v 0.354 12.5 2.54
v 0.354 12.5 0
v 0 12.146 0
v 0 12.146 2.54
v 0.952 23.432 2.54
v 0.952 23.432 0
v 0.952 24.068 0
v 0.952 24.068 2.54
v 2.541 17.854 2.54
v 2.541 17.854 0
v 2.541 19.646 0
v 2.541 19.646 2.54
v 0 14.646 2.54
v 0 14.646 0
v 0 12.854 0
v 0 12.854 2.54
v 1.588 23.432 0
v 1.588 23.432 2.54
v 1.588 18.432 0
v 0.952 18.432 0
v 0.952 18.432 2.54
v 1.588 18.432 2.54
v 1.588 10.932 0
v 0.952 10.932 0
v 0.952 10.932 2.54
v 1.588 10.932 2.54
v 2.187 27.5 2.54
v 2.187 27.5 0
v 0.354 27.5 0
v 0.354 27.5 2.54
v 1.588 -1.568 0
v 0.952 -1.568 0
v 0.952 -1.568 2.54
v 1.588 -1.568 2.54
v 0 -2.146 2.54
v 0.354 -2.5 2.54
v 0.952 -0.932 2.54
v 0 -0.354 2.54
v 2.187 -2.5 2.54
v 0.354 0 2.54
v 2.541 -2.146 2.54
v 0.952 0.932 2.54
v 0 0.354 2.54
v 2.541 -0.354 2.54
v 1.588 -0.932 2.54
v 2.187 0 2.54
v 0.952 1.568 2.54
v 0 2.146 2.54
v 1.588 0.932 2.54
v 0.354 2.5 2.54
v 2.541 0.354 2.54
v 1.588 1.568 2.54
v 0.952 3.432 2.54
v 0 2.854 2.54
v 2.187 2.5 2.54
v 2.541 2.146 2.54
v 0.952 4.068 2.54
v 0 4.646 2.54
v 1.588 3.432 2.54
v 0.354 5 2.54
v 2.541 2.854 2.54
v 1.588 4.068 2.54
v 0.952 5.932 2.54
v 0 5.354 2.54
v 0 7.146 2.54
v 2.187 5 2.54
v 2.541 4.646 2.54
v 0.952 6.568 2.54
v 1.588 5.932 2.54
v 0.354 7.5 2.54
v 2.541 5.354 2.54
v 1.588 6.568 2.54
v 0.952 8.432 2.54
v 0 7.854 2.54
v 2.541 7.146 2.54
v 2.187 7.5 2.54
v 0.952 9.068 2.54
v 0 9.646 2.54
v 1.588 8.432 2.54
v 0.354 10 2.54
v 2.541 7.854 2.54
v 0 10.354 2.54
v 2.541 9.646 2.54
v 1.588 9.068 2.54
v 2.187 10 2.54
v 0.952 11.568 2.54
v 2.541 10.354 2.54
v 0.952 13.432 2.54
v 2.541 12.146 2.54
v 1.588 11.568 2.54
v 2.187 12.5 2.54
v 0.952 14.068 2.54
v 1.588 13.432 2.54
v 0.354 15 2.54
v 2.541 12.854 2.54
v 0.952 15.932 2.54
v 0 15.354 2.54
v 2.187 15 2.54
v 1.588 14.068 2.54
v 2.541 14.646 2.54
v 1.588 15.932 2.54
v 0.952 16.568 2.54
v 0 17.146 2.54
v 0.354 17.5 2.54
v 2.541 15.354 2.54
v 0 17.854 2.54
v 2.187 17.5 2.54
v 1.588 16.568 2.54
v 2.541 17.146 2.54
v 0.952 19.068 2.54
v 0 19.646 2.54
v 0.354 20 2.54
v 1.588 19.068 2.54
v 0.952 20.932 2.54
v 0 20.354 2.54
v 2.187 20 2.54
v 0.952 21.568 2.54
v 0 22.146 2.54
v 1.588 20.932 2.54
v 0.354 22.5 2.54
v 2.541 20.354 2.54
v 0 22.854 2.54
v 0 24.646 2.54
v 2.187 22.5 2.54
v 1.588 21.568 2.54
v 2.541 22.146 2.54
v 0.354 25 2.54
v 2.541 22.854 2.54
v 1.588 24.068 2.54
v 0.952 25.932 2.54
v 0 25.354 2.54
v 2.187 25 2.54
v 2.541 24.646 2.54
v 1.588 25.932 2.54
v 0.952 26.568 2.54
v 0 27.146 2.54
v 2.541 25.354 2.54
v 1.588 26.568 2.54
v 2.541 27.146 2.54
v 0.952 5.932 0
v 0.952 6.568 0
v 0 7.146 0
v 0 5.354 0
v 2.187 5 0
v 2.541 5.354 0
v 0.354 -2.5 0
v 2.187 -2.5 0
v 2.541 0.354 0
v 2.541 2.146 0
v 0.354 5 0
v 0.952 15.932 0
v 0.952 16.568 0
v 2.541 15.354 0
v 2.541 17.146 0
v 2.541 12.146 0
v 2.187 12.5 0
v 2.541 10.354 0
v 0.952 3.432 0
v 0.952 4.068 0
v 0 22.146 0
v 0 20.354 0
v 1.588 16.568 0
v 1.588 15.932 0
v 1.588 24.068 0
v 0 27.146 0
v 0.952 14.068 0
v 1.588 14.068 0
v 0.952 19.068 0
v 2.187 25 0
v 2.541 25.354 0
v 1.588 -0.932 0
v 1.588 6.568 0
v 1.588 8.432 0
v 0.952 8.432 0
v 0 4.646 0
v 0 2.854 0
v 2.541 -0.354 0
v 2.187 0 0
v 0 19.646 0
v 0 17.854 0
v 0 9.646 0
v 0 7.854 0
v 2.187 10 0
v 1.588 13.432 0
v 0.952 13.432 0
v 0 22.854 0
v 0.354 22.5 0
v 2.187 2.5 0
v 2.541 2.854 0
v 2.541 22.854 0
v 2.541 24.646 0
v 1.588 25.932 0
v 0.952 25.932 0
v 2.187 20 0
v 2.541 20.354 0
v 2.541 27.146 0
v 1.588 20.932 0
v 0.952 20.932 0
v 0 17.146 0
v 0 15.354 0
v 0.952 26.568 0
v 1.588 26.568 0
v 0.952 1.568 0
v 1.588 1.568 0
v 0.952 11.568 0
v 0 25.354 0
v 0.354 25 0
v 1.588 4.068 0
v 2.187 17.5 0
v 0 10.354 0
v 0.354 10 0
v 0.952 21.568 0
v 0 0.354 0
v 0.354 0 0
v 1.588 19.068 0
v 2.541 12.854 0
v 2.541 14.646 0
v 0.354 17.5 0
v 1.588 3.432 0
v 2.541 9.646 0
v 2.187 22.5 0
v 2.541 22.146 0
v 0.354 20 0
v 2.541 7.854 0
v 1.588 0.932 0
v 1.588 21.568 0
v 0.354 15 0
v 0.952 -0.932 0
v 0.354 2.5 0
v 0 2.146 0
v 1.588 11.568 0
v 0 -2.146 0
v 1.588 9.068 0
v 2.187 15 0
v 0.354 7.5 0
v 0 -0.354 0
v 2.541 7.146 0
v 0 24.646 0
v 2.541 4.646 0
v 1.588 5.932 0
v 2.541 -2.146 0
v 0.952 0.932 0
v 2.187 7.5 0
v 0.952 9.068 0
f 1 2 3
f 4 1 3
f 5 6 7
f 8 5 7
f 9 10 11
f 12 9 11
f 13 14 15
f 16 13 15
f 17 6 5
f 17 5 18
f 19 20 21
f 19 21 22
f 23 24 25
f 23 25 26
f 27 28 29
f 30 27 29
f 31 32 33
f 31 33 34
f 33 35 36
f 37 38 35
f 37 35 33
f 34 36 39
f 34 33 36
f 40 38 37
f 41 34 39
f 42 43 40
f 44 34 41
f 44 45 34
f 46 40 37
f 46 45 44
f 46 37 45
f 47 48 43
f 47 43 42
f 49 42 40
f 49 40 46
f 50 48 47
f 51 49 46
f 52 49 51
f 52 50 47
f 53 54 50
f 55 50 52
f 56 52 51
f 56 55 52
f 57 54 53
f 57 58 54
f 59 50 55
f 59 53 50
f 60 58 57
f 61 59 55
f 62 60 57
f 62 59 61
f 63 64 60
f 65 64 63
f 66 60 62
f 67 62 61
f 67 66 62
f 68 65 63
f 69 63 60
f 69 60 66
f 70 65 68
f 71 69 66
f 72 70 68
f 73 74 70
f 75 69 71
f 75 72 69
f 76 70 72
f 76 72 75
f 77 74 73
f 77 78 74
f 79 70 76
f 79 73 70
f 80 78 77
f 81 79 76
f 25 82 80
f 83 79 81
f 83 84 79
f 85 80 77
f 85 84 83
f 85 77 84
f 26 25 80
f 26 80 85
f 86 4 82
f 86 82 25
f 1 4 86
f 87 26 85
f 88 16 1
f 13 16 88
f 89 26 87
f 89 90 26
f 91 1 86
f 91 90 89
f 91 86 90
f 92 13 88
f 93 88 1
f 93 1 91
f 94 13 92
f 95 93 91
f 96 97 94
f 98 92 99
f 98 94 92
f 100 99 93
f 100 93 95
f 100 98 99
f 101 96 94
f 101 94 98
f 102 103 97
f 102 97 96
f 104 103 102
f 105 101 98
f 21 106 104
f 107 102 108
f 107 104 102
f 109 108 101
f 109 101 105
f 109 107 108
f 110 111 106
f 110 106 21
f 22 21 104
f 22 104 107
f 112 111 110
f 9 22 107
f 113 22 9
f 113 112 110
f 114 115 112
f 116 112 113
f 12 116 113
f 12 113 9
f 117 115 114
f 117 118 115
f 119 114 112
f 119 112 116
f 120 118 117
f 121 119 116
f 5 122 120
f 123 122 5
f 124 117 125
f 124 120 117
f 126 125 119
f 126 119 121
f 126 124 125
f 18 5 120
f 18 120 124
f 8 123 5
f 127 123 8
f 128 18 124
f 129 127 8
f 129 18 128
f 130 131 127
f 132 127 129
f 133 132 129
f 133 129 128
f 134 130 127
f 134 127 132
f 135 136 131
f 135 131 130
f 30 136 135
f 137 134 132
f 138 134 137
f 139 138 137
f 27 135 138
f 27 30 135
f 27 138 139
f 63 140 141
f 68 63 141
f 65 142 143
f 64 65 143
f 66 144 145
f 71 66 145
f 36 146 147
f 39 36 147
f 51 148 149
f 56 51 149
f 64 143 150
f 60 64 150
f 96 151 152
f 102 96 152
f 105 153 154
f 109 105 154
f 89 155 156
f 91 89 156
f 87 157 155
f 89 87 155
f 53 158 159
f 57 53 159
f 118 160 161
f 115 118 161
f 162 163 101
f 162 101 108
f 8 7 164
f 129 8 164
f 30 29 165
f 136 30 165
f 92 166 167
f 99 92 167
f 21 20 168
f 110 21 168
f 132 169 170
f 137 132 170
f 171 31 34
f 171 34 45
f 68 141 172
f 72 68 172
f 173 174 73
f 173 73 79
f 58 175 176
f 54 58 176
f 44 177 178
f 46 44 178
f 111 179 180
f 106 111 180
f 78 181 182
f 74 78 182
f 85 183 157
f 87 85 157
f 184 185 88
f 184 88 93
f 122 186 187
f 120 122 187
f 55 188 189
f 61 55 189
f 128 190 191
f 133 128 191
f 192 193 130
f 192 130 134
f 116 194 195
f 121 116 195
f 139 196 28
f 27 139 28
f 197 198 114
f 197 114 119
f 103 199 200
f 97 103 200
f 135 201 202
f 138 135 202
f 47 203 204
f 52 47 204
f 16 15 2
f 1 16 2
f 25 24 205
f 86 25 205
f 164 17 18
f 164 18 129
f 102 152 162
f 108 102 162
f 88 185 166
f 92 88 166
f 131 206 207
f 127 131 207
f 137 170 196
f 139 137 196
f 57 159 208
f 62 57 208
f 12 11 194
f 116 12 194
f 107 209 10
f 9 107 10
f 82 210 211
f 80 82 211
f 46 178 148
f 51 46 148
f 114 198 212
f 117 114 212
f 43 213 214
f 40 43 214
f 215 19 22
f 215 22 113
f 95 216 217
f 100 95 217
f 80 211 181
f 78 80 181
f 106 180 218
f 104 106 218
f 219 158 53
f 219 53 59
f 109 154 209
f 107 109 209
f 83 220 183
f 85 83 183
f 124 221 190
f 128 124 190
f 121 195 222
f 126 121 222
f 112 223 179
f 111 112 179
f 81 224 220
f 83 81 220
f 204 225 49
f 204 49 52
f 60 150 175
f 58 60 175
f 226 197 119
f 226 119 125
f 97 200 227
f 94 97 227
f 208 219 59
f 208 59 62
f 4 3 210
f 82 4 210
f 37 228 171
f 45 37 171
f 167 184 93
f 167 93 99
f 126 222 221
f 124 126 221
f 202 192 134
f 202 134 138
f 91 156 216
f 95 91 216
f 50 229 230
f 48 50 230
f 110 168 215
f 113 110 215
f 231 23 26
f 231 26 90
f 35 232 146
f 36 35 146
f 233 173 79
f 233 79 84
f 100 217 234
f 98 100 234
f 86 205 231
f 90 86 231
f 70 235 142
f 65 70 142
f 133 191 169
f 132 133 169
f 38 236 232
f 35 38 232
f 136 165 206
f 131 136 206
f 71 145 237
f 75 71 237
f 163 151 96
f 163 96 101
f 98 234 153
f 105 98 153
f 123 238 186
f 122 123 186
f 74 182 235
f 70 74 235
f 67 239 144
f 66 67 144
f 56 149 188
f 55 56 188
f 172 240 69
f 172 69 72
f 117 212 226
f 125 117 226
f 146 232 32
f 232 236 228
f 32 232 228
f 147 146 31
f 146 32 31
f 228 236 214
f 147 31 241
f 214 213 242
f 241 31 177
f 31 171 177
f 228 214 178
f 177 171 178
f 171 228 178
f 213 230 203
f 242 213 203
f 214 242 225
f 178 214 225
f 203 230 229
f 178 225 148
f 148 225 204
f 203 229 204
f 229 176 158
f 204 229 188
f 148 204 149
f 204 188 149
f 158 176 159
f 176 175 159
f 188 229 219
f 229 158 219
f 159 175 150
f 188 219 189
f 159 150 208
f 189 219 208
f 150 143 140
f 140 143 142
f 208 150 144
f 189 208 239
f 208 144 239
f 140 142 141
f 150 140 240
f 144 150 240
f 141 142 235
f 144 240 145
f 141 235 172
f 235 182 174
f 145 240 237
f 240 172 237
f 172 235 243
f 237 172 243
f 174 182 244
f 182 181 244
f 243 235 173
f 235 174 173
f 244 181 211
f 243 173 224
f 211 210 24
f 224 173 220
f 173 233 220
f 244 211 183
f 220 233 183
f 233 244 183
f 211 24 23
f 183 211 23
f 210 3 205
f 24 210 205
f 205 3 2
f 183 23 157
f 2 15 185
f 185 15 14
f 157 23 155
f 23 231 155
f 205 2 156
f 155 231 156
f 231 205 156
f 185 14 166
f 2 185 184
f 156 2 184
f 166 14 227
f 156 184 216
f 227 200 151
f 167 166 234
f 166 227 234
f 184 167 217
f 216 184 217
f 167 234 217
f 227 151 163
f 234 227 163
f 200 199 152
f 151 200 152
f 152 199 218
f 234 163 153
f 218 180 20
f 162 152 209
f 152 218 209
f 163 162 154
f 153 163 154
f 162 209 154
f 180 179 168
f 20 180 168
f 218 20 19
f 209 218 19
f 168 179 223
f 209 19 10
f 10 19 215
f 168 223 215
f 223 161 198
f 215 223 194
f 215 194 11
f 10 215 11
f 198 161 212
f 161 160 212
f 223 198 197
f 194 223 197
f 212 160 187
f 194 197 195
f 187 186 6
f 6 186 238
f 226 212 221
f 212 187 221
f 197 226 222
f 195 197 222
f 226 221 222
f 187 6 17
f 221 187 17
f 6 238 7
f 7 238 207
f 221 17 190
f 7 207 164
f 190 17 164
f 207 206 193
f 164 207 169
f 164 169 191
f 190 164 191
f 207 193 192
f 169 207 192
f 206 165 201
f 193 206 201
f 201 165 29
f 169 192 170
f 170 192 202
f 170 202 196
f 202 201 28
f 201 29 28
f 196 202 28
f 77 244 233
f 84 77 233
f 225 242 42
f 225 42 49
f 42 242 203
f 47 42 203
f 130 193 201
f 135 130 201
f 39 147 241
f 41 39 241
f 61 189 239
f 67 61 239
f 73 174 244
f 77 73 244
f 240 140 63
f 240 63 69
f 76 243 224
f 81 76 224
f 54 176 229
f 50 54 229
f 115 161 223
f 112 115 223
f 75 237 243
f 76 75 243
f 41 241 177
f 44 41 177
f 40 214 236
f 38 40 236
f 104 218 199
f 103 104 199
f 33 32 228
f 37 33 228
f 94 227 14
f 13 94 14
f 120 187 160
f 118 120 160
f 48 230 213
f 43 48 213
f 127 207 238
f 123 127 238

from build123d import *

# Parameters (mm, degrees)
PIN_DRAWING_W       = 0.636
PIN_DRAWING_H       = 0.636
BOSS_EXTRUDE1_DEPTH = 2.54


with BuildPart() as part:
    # pin_drawing → Boss-Extrude1 (new body)
    with BuildSketch(Plane.XY):
        Polygon((0, 2.146446609), (0, 0.353553391), (0.353553391, 0), (0, -0.353553391), (0, -2.146446609), (0.353553391, -2.5), (2.187446609, -2.5), (2.541, -2.146446609), (2.541, -0.353553391), (2.187446609, 0), (2.541, 0.353553391), (2.541, 2.146446609), (2.187446609, 2.5), (2.541, 2.853553391), (2.541, 4.646446609), (2.187446609, 5), (2.541, 5.353553391), (2.541, 7.146446609), (2.187446609, 7.5), (2.541, 7.853553391), (2.541, 9.646446609), (2.187446609, 10), (2.541, 10.353553391), (2.541, 12.146446609), (2.187446609, 12.5), (2.541, 12.853553391), (2.541, 14.646446609), (2.187446609, 15), (2.541, 15.353553391), (2.541, 17.146446609), (2.187446609, 17.5), (2.541, 17.853553391), (2.541, 19.646446609), (2.187446609, 20), (2.541, 20.353553391), (2.541, 22.146446609), (2.187446609, 22.5), (2.541, 22.853553391), (2.541, 24.646446609), (2.187446609, 25), (2.541, 25.353553391), (2.541, 27.146446609), (2.187446609, 27.5), (0.353553391, 27.5), (0, 27.146446609), (0, 25.353553391), (0.353553391, 25), (0, 24.646446609), (0, 22.853553391), (0.353553391, 22.5), (0, 22.146446609), (0, 20.353553391), (0.353553391, 20), (0, 19.646446609), (0, 17.853553391), (0.353553391, 17.5), (0, 17.146446609), (0, 15.353553391), (0.353553391, 15), (0, 14.646446609), (0, 12.853553391), (0.353553391, 12.5), (0, 12.146446609), (0, 10.353553391), (0.353553391, 10), (0, 9.646446609), (0, 7.853553391), (0.353553391, 7.5), (0, 7.146446609), (0, 5.353553391), (0.353553391, 5), (0, 4.646446609), (0, 2.853553391), (0.353553391, 2.5), align=None)
        with Locations((1.2705, -1.25)):
            Rectangle(PIN_DRAWING_W, PIN_DRAWING_H, mode=Mode.SUBTRACT)
        with Locations((1.2705, 1.25)):
            Rectangle(PIN_DRAWING_W, PIN_DRAWING_H, mode=Mode.SUBTRACT)
        with Locations((1.2705, 3.75)):
            Rectangle(PIN_DRAWING_W, PIN_DRAWING_H, mode=Mode.SUBTRACT)
        with Locations((1.2705, 6.25)):
            Rectangle(PIN_DRAWING_W, PIN_DRAWING_H, mode=Mode.SUBTRACT)
        with Locations((1.2705, 8.75)):
            Rectangle(PIN_DRAWING_W, PIN_DRAWING_H, mode=Mode.SUBTRACT)
        with Locations((1.2705, 11.25)):
            Rectangle(PIN_DRAWING_W, PIN_DRAWING_H, mode=Mode.SUBTRACT)
        with Locations((1.2705, 13.75)):
            Rectangle(PIN_DRAWING_W, PIN_DRAWING_H, mode=Mode.SUBTRACT)
        with Locations((1.2705, 16.25)):
            Rectangle(PIN_DRAWING_W, PIN_DRAWING_H, mode=Mode.SUBTRACT)
        with Locations((1.2705, 18.75)):
            Rectangle(PIN_DRAWING_W, PIN_DRAWING_H, mode=Mode.SUBTRACT)
        with Locations((1.2705, 21.25)):
            Rectangle(PIN_DRAWING_W, PIN_DRAWING_H, mode=Mode.SUBTRACT)
        with Locations((1.2705, 23.75)):
            Rectangle(PIN_DRAWING_W, PIN_DRAWING_H, mode=Mode.SUBTRACT)
        with Locations((1.2705, 26.25)):
            Rectangle(PIN_DRAWING_W, PIN_DRAWING_H, mode=Mode.SUBTRACT)
    extrude(amount=BOSS_EXTRUDE1_DEPTH)


solid = part.part
